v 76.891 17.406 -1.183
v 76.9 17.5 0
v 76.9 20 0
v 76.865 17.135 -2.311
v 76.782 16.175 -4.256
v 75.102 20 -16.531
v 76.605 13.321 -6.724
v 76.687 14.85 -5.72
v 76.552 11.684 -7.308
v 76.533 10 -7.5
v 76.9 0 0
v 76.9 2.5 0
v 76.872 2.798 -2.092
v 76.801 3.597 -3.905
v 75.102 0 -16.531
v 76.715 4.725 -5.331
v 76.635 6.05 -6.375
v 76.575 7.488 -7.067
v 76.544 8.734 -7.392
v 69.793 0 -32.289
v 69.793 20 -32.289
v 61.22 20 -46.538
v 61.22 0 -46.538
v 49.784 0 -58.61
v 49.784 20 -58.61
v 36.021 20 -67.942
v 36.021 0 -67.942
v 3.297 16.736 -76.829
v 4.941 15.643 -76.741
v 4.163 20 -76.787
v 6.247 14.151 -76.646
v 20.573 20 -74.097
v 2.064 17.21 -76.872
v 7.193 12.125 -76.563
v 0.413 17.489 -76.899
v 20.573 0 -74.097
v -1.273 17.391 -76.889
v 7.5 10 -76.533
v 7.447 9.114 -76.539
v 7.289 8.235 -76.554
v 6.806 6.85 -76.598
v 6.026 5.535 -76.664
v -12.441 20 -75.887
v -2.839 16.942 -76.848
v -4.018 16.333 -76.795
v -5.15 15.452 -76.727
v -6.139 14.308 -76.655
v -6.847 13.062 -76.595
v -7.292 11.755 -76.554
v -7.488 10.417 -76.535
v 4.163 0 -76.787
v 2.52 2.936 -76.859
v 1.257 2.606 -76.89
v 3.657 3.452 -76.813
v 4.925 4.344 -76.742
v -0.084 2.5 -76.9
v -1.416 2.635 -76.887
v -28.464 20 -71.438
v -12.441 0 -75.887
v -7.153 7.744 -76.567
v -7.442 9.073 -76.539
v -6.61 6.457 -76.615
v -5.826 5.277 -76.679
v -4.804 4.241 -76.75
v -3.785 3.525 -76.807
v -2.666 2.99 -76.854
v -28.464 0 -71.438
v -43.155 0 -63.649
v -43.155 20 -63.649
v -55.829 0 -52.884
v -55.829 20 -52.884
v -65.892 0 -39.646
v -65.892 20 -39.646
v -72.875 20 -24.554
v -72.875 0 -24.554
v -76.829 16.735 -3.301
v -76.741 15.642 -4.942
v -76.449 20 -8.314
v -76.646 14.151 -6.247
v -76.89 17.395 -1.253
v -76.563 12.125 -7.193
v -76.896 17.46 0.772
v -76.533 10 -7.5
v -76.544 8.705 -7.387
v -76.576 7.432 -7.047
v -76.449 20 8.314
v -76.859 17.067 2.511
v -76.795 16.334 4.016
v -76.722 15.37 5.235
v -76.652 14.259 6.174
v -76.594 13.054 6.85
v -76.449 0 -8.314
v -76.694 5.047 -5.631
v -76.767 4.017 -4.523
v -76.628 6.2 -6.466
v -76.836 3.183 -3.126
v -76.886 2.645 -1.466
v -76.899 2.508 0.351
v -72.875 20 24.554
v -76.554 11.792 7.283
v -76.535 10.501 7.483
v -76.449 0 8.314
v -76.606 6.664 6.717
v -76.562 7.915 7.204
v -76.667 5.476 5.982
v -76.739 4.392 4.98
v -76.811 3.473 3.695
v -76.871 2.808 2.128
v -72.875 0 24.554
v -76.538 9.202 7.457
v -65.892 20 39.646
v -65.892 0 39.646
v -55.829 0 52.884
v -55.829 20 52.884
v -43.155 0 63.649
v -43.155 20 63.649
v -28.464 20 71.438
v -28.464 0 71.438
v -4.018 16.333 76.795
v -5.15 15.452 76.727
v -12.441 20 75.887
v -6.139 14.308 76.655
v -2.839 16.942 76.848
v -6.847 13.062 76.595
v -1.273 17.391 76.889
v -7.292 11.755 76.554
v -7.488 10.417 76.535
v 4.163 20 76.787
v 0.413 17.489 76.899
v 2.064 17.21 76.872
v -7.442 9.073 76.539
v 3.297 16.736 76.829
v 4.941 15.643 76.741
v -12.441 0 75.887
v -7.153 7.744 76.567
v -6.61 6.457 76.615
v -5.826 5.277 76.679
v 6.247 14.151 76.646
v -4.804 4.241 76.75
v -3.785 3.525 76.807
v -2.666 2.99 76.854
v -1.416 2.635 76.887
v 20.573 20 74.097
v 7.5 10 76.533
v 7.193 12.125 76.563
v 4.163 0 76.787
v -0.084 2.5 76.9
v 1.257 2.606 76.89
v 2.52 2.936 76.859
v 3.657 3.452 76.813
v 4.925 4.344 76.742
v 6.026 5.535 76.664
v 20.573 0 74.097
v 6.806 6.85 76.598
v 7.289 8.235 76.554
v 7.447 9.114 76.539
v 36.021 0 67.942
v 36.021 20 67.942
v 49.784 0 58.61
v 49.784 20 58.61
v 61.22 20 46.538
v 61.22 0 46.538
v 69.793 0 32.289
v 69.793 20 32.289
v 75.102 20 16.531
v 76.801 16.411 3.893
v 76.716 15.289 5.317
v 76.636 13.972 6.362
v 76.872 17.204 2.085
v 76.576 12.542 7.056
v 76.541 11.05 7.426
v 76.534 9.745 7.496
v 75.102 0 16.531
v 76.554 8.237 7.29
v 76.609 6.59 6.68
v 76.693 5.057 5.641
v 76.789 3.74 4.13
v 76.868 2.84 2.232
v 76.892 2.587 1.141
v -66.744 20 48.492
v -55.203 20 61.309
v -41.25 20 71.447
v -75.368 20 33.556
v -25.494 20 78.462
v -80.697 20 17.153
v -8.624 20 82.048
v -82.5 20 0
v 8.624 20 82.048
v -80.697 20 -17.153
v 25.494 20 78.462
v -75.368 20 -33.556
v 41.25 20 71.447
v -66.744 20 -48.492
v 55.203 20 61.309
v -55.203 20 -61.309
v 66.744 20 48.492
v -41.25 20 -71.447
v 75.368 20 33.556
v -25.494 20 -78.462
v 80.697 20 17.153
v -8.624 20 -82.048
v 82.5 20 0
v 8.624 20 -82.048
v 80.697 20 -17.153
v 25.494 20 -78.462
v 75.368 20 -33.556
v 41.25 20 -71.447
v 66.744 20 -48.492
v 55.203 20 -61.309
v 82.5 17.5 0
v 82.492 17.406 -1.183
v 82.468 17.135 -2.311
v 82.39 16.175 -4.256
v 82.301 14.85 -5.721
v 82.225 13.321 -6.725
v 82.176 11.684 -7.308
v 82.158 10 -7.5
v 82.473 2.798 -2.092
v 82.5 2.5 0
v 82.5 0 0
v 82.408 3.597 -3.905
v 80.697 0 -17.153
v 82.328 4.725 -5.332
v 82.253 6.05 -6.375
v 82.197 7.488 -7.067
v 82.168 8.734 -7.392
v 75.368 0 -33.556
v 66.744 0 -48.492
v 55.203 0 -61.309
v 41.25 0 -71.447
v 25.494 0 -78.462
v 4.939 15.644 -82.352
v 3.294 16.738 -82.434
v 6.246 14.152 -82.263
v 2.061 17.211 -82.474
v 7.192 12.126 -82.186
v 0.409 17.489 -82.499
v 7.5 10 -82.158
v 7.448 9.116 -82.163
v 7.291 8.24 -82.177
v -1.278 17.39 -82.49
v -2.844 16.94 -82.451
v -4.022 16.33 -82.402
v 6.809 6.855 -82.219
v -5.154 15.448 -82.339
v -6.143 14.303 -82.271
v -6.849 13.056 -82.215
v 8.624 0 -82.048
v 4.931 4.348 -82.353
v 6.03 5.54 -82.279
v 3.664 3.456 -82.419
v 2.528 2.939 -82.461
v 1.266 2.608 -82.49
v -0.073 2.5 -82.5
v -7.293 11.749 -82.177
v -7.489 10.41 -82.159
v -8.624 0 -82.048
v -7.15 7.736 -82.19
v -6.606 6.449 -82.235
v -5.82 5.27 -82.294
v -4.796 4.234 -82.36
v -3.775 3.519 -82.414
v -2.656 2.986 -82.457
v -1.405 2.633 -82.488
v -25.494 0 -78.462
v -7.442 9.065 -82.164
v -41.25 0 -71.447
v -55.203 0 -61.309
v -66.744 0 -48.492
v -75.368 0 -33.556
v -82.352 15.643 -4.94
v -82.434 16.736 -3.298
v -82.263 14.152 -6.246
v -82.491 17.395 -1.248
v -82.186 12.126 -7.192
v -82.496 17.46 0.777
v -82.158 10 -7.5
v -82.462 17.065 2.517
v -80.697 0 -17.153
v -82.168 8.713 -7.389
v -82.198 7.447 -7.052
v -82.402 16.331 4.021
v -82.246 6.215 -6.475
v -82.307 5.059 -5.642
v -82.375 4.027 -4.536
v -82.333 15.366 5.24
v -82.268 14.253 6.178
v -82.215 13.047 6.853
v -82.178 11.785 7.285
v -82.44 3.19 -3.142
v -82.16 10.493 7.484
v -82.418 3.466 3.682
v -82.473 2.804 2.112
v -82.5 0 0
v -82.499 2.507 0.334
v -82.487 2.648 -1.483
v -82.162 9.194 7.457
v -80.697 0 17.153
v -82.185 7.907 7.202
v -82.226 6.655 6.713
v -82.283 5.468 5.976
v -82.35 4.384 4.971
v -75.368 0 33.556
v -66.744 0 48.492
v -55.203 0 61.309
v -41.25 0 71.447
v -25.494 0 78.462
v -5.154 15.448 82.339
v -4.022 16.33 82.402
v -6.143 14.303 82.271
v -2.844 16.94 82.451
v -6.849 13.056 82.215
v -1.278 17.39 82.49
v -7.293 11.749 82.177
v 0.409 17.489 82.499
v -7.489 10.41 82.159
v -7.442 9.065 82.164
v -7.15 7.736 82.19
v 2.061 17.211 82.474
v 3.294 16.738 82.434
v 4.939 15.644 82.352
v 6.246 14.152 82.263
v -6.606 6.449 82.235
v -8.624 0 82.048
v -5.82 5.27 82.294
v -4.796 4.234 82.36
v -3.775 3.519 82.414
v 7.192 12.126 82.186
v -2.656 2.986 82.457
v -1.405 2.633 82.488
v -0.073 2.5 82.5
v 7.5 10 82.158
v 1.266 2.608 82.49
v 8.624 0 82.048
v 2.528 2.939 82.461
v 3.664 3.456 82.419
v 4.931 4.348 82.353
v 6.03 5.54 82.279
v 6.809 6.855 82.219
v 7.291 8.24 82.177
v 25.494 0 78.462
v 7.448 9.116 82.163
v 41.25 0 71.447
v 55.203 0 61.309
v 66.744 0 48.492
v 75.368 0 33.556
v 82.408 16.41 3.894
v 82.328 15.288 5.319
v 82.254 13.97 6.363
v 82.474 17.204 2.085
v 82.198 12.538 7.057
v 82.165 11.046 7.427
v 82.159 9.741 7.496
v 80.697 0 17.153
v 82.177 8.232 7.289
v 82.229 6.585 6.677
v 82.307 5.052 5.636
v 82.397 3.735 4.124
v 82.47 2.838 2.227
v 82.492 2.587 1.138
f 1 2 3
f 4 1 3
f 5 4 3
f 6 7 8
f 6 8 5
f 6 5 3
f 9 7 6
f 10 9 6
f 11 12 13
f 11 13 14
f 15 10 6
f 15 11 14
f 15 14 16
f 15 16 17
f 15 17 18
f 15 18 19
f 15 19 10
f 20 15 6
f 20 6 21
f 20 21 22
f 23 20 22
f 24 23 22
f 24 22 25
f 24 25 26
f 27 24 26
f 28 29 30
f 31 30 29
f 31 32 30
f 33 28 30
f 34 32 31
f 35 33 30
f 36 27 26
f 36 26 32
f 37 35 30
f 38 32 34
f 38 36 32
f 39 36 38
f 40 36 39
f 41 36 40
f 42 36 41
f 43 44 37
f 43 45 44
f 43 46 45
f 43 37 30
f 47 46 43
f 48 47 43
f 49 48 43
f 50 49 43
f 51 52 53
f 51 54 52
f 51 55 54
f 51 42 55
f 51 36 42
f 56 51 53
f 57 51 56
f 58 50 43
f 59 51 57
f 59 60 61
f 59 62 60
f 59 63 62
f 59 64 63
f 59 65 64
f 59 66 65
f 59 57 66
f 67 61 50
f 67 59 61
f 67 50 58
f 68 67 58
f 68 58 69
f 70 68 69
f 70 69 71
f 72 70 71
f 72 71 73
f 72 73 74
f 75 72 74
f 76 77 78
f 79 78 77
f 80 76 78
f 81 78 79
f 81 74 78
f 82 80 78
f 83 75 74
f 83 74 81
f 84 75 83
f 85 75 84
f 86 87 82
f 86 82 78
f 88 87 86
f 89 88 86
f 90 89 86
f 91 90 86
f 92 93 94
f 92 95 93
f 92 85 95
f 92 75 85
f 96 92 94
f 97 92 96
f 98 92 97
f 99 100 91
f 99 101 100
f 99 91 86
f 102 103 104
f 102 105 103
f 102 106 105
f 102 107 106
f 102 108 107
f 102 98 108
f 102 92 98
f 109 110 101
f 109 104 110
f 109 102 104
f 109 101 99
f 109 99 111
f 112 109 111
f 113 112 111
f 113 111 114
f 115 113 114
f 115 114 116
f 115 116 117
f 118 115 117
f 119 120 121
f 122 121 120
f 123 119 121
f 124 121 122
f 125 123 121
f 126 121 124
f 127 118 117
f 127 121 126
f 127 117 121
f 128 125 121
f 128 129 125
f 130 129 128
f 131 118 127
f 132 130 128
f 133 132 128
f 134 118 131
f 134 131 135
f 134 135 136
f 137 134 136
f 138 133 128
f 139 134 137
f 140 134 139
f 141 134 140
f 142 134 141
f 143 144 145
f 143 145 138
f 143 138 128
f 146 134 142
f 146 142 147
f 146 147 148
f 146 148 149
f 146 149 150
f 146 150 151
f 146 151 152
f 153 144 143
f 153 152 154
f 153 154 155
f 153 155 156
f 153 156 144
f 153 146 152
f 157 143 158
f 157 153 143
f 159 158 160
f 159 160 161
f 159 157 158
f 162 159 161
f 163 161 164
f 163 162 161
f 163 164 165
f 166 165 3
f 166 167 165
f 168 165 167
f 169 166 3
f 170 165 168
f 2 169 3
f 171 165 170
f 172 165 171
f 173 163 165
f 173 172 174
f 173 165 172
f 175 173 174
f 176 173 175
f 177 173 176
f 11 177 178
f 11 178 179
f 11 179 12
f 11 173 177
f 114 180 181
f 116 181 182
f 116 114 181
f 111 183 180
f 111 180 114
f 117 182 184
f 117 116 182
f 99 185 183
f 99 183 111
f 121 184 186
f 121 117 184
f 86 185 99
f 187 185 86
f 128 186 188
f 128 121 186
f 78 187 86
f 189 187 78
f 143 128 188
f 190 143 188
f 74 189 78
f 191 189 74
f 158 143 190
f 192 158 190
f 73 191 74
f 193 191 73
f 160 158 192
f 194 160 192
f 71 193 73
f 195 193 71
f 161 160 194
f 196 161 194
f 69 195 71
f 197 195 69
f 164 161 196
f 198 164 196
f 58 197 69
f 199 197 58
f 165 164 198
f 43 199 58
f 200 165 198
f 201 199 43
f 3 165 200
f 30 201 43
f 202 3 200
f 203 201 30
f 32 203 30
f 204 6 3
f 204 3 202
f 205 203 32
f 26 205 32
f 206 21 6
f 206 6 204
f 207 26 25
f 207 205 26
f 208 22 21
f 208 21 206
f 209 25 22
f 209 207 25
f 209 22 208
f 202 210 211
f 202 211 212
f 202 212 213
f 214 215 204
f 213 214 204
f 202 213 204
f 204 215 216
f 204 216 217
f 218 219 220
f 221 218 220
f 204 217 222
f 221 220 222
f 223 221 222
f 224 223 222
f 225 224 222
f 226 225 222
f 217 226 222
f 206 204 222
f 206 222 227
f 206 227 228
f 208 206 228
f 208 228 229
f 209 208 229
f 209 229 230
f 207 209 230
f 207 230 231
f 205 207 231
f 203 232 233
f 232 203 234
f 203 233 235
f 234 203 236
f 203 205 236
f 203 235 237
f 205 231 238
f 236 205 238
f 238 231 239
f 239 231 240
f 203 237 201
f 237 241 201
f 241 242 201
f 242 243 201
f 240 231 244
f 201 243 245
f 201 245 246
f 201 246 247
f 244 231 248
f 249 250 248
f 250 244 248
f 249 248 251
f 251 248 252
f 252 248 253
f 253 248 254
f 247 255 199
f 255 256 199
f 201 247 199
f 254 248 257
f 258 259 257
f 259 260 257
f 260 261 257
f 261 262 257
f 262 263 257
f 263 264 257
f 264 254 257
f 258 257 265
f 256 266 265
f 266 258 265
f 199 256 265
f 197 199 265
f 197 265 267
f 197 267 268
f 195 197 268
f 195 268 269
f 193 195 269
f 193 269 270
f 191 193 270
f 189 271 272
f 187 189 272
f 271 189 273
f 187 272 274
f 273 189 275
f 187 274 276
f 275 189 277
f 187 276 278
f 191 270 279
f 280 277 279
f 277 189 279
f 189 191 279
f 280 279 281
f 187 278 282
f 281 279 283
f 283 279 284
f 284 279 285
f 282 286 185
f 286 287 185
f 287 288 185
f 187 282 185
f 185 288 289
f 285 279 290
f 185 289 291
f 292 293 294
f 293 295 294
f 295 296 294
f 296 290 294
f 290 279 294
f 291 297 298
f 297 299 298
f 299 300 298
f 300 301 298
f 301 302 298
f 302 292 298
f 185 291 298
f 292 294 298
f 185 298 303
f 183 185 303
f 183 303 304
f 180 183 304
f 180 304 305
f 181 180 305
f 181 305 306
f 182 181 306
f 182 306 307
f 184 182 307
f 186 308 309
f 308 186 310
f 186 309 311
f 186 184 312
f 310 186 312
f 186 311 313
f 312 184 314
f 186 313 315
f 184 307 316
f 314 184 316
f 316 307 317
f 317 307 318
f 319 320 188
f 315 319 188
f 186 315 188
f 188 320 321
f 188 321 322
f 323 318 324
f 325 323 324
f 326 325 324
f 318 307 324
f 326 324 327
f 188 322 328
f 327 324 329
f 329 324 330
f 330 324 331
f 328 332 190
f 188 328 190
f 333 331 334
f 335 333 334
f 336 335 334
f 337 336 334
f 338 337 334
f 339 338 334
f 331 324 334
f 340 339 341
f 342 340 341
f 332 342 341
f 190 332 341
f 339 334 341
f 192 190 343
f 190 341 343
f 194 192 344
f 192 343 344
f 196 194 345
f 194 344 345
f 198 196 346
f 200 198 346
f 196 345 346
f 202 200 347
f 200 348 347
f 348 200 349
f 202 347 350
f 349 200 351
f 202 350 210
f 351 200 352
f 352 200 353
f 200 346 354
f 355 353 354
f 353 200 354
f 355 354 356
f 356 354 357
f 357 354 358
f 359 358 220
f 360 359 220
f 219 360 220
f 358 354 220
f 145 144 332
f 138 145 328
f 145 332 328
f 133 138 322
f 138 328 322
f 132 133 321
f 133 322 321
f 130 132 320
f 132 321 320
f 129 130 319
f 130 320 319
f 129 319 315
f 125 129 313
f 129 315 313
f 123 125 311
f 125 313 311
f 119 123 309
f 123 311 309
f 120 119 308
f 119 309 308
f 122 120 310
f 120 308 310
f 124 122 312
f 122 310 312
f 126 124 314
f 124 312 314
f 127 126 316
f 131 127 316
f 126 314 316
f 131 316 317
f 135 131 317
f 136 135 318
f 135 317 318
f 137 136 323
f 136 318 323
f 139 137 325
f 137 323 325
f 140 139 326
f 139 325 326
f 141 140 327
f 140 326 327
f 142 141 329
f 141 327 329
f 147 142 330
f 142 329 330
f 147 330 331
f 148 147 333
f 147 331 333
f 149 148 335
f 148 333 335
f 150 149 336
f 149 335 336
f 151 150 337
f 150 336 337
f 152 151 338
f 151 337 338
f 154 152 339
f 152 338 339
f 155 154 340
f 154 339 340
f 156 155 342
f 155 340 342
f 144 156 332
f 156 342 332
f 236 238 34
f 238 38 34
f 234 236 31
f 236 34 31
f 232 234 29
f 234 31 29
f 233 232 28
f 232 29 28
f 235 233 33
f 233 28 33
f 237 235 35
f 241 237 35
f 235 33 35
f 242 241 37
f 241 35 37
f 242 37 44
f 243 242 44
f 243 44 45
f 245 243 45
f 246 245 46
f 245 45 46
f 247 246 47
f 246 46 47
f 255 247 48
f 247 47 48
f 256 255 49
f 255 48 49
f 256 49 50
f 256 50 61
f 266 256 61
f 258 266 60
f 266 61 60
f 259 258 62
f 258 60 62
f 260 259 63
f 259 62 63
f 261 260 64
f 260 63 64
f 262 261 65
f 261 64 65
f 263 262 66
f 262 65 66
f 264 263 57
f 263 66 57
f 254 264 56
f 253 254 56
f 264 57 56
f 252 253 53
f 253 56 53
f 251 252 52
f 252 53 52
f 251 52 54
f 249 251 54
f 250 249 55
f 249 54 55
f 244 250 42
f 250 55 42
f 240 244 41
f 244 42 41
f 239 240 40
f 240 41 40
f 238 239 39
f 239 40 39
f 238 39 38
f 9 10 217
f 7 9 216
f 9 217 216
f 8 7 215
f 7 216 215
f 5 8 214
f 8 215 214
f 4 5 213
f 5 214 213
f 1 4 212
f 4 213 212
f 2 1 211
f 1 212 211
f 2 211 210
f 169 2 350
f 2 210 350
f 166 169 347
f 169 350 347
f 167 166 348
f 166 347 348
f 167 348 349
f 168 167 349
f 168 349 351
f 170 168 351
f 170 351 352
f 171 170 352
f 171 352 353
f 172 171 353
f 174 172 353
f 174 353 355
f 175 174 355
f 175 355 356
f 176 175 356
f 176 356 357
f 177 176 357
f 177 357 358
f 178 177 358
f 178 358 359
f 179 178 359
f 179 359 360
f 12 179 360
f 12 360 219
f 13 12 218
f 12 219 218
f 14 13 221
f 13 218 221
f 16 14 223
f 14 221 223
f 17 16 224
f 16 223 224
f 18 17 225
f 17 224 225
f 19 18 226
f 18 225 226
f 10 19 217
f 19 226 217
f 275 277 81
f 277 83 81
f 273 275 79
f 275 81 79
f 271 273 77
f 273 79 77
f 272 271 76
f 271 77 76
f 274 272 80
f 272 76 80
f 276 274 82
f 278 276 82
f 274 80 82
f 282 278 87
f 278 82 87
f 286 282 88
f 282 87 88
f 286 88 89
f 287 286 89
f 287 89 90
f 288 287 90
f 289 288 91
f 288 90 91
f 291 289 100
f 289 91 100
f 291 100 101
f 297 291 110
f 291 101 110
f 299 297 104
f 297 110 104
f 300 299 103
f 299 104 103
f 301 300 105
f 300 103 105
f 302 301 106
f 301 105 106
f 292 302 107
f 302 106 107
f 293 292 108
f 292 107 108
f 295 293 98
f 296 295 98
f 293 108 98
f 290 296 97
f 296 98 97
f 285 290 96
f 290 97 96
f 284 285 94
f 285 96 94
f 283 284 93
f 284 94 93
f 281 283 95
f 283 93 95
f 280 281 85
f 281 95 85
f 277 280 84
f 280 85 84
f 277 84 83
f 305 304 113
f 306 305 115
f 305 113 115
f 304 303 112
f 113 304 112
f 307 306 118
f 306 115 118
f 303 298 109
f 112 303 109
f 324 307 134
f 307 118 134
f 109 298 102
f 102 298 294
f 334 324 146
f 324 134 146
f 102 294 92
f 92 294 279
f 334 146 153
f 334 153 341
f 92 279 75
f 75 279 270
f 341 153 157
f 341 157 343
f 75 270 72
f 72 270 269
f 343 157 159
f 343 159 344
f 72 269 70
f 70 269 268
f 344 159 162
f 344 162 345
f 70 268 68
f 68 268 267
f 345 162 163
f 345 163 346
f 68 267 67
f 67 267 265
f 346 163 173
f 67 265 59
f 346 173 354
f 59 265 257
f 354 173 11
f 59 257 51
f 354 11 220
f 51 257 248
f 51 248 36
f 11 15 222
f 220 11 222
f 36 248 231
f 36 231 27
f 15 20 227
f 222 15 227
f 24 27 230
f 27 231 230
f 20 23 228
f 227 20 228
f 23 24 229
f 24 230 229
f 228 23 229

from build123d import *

# Parameters (mm, degrees)
SKETCH1_R           = 82.5
SKETCH1_R_2         = 76.9
EXTRUDE_THIN1_DEPTH = 20
SKETCH2_R           = 7.5
CUT_EXTRUDE1_DEPTH  = 100
CIRPATTERN1_COUNT   = 2
CIRPATTERN1_ANGLE   = 90


with BuildPart() as part:
    # Sketch1 → Extrude-Thin1 (new body)
    with BuildSketch(Plane(origin=(0, 0, 0), x_dir=(1, 0, 0), z_dir=(0, 1, 0))):
        Circle(SKETCH1_R)
        Circle(SKETCH1_R_2, mode=Mode.SUBTRACT)
    extrude(amount=EXTRUDE_THIN1_DEPTH)

    # Sketch2 → Cut-Extrude1 (cut, symmetric)
    with BuildSketch(Plane(origin=(0, 0, 0), x_dir=(0, 0, -1), z_dir=(1, 0, 0))):
        with Locations((0, 10)):
            Circle(SKETCH2_R)
    cut_extrude1 = extrude(amount=CUT_EXTRUDE1_DEPTH, both=True, mode=Mode.SUBTRACT)

    # CirPattern1: Cut-Extrude1 ×2 about axis
    cirpattern1_axis = Axis((0, 20, 0), (0, -1, 0))
    for i in range(1, CIRPATTERN1_COUNT):
        add(cut_extrude1.rotate(cirpattern1_axis, i * CIRPATTERN1_ANGLE / (CIRPATTERN1_COUNT - 1)), mode=Mode.SUBTRACT)


solid = part.part
